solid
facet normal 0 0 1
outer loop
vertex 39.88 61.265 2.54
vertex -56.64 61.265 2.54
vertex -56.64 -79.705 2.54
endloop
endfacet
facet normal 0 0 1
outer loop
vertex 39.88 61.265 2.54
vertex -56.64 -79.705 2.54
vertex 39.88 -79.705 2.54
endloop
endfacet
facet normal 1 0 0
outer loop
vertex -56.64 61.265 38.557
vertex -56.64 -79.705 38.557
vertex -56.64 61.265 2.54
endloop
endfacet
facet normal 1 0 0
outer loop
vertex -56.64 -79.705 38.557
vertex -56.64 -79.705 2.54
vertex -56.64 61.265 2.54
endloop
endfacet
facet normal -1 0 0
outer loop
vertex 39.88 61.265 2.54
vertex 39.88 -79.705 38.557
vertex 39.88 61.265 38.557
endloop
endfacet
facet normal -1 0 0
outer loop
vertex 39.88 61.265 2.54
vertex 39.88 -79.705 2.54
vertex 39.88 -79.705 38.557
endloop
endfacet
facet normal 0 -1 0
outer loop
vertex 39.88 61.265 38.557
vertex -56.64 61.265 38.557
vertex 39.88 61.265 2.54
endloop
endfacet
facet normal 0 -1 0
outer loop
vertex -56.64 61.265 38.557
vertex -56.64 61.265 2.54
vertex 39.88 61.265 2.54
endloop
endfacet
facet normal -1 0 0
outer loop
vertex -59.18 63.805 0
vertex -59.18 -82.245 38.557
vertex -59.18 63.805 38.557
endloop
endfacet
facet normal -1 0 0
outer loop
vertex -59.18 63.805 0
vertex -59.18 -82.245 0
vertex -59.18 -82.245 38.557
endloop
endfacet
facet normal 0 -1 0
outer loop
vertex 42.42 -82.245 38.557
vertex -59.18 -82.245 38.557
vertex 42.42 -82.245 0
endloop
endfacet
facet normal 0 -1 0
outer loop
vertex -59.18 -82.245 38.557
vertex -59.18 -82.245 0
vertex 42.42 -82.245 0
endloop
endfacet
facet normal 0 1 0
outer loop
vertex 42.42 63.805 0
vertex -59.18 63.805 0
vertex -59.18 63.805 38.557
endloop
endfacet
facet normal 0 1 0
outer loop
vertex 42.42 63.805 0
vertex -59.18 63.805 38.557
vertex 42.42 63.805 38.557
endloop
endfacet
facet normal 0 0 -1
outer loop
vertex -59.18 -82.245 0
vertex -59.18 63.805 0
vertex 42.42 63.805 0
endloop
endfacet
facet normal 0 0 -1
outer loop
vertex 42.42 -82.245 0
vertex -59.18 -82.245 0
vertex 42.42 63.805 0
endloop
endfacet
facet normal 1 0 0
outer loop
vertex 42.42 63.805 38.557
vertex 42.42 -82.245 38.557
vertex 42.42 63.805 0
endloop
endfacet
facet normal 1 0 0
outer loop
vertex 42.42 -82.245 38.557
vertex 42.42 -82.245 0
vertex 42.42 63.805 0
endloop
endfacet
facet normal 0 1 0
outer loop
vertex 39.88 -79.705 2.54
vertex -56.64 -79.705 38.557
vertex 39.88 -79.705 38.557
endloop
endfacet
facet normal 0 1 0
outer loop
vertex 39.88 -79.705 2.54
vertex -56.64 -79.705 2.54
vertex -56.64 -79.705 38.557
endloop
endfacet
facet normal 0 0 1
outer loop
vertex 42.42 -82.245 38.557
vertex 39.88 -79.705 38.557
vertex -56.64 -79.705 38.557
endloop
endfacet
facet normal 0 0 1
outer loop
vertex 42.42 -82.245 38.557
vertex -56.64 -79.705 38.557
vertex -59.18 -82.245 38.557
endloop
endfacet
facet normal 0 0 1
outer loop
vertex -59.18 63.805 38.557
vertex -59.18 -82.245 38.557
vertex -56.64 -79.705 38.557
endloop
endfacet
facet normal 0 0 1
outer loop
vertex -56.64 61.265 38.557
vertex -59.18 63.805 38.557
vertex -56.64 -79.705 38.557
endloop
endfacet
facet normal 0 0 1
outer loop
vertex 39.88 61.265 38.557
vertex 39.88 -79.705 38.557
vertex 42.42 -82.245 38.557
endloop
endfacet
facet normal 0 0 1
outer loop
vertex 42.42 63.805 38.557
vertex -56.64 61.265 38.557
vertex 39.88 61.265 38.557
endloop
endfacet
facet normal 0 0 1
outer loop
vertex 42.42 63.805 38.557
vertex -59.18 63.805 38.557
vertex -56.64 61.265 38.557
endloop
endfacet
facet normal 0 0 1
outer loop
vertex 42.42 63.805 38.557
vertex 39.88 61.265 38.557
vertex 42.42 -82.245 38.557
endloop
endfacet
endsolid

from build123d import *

# Parameters (mm, degrees)
F0_W     = 101.6
F0_H     = 146.05
F1_DEPTH = 25.4
F2_T     = -2.54
F3_DEPTH = 13.157164678


with BuildPart() as f1:
    # F0 (on Top) → F1 (new body)
    with BuildSketch(Plane.XY):
        with Locations((-8.3804931492, -9.2198206152)):
            Rectangle(F0_W, F0_H)
    extrude(amount=F1_DEPTH)

    # F2
    f2_openings = [f1.faces().sort_by_distance(p)[0] for p in [
        (-8.380493, -9.219821, 25.4),
    ]]
    offset(amount=F2_T, openings=f2_openings)

    # F3 (add): a face of the model
    f3_faces = [f1.faces().sort_by_distance(p)[0] for p in [
        (40.6403732836, -9.2198206152, 25.4),
    ]]
    extrude(f3_faces, amount=F3_DEPTH)


solid = f1.part
